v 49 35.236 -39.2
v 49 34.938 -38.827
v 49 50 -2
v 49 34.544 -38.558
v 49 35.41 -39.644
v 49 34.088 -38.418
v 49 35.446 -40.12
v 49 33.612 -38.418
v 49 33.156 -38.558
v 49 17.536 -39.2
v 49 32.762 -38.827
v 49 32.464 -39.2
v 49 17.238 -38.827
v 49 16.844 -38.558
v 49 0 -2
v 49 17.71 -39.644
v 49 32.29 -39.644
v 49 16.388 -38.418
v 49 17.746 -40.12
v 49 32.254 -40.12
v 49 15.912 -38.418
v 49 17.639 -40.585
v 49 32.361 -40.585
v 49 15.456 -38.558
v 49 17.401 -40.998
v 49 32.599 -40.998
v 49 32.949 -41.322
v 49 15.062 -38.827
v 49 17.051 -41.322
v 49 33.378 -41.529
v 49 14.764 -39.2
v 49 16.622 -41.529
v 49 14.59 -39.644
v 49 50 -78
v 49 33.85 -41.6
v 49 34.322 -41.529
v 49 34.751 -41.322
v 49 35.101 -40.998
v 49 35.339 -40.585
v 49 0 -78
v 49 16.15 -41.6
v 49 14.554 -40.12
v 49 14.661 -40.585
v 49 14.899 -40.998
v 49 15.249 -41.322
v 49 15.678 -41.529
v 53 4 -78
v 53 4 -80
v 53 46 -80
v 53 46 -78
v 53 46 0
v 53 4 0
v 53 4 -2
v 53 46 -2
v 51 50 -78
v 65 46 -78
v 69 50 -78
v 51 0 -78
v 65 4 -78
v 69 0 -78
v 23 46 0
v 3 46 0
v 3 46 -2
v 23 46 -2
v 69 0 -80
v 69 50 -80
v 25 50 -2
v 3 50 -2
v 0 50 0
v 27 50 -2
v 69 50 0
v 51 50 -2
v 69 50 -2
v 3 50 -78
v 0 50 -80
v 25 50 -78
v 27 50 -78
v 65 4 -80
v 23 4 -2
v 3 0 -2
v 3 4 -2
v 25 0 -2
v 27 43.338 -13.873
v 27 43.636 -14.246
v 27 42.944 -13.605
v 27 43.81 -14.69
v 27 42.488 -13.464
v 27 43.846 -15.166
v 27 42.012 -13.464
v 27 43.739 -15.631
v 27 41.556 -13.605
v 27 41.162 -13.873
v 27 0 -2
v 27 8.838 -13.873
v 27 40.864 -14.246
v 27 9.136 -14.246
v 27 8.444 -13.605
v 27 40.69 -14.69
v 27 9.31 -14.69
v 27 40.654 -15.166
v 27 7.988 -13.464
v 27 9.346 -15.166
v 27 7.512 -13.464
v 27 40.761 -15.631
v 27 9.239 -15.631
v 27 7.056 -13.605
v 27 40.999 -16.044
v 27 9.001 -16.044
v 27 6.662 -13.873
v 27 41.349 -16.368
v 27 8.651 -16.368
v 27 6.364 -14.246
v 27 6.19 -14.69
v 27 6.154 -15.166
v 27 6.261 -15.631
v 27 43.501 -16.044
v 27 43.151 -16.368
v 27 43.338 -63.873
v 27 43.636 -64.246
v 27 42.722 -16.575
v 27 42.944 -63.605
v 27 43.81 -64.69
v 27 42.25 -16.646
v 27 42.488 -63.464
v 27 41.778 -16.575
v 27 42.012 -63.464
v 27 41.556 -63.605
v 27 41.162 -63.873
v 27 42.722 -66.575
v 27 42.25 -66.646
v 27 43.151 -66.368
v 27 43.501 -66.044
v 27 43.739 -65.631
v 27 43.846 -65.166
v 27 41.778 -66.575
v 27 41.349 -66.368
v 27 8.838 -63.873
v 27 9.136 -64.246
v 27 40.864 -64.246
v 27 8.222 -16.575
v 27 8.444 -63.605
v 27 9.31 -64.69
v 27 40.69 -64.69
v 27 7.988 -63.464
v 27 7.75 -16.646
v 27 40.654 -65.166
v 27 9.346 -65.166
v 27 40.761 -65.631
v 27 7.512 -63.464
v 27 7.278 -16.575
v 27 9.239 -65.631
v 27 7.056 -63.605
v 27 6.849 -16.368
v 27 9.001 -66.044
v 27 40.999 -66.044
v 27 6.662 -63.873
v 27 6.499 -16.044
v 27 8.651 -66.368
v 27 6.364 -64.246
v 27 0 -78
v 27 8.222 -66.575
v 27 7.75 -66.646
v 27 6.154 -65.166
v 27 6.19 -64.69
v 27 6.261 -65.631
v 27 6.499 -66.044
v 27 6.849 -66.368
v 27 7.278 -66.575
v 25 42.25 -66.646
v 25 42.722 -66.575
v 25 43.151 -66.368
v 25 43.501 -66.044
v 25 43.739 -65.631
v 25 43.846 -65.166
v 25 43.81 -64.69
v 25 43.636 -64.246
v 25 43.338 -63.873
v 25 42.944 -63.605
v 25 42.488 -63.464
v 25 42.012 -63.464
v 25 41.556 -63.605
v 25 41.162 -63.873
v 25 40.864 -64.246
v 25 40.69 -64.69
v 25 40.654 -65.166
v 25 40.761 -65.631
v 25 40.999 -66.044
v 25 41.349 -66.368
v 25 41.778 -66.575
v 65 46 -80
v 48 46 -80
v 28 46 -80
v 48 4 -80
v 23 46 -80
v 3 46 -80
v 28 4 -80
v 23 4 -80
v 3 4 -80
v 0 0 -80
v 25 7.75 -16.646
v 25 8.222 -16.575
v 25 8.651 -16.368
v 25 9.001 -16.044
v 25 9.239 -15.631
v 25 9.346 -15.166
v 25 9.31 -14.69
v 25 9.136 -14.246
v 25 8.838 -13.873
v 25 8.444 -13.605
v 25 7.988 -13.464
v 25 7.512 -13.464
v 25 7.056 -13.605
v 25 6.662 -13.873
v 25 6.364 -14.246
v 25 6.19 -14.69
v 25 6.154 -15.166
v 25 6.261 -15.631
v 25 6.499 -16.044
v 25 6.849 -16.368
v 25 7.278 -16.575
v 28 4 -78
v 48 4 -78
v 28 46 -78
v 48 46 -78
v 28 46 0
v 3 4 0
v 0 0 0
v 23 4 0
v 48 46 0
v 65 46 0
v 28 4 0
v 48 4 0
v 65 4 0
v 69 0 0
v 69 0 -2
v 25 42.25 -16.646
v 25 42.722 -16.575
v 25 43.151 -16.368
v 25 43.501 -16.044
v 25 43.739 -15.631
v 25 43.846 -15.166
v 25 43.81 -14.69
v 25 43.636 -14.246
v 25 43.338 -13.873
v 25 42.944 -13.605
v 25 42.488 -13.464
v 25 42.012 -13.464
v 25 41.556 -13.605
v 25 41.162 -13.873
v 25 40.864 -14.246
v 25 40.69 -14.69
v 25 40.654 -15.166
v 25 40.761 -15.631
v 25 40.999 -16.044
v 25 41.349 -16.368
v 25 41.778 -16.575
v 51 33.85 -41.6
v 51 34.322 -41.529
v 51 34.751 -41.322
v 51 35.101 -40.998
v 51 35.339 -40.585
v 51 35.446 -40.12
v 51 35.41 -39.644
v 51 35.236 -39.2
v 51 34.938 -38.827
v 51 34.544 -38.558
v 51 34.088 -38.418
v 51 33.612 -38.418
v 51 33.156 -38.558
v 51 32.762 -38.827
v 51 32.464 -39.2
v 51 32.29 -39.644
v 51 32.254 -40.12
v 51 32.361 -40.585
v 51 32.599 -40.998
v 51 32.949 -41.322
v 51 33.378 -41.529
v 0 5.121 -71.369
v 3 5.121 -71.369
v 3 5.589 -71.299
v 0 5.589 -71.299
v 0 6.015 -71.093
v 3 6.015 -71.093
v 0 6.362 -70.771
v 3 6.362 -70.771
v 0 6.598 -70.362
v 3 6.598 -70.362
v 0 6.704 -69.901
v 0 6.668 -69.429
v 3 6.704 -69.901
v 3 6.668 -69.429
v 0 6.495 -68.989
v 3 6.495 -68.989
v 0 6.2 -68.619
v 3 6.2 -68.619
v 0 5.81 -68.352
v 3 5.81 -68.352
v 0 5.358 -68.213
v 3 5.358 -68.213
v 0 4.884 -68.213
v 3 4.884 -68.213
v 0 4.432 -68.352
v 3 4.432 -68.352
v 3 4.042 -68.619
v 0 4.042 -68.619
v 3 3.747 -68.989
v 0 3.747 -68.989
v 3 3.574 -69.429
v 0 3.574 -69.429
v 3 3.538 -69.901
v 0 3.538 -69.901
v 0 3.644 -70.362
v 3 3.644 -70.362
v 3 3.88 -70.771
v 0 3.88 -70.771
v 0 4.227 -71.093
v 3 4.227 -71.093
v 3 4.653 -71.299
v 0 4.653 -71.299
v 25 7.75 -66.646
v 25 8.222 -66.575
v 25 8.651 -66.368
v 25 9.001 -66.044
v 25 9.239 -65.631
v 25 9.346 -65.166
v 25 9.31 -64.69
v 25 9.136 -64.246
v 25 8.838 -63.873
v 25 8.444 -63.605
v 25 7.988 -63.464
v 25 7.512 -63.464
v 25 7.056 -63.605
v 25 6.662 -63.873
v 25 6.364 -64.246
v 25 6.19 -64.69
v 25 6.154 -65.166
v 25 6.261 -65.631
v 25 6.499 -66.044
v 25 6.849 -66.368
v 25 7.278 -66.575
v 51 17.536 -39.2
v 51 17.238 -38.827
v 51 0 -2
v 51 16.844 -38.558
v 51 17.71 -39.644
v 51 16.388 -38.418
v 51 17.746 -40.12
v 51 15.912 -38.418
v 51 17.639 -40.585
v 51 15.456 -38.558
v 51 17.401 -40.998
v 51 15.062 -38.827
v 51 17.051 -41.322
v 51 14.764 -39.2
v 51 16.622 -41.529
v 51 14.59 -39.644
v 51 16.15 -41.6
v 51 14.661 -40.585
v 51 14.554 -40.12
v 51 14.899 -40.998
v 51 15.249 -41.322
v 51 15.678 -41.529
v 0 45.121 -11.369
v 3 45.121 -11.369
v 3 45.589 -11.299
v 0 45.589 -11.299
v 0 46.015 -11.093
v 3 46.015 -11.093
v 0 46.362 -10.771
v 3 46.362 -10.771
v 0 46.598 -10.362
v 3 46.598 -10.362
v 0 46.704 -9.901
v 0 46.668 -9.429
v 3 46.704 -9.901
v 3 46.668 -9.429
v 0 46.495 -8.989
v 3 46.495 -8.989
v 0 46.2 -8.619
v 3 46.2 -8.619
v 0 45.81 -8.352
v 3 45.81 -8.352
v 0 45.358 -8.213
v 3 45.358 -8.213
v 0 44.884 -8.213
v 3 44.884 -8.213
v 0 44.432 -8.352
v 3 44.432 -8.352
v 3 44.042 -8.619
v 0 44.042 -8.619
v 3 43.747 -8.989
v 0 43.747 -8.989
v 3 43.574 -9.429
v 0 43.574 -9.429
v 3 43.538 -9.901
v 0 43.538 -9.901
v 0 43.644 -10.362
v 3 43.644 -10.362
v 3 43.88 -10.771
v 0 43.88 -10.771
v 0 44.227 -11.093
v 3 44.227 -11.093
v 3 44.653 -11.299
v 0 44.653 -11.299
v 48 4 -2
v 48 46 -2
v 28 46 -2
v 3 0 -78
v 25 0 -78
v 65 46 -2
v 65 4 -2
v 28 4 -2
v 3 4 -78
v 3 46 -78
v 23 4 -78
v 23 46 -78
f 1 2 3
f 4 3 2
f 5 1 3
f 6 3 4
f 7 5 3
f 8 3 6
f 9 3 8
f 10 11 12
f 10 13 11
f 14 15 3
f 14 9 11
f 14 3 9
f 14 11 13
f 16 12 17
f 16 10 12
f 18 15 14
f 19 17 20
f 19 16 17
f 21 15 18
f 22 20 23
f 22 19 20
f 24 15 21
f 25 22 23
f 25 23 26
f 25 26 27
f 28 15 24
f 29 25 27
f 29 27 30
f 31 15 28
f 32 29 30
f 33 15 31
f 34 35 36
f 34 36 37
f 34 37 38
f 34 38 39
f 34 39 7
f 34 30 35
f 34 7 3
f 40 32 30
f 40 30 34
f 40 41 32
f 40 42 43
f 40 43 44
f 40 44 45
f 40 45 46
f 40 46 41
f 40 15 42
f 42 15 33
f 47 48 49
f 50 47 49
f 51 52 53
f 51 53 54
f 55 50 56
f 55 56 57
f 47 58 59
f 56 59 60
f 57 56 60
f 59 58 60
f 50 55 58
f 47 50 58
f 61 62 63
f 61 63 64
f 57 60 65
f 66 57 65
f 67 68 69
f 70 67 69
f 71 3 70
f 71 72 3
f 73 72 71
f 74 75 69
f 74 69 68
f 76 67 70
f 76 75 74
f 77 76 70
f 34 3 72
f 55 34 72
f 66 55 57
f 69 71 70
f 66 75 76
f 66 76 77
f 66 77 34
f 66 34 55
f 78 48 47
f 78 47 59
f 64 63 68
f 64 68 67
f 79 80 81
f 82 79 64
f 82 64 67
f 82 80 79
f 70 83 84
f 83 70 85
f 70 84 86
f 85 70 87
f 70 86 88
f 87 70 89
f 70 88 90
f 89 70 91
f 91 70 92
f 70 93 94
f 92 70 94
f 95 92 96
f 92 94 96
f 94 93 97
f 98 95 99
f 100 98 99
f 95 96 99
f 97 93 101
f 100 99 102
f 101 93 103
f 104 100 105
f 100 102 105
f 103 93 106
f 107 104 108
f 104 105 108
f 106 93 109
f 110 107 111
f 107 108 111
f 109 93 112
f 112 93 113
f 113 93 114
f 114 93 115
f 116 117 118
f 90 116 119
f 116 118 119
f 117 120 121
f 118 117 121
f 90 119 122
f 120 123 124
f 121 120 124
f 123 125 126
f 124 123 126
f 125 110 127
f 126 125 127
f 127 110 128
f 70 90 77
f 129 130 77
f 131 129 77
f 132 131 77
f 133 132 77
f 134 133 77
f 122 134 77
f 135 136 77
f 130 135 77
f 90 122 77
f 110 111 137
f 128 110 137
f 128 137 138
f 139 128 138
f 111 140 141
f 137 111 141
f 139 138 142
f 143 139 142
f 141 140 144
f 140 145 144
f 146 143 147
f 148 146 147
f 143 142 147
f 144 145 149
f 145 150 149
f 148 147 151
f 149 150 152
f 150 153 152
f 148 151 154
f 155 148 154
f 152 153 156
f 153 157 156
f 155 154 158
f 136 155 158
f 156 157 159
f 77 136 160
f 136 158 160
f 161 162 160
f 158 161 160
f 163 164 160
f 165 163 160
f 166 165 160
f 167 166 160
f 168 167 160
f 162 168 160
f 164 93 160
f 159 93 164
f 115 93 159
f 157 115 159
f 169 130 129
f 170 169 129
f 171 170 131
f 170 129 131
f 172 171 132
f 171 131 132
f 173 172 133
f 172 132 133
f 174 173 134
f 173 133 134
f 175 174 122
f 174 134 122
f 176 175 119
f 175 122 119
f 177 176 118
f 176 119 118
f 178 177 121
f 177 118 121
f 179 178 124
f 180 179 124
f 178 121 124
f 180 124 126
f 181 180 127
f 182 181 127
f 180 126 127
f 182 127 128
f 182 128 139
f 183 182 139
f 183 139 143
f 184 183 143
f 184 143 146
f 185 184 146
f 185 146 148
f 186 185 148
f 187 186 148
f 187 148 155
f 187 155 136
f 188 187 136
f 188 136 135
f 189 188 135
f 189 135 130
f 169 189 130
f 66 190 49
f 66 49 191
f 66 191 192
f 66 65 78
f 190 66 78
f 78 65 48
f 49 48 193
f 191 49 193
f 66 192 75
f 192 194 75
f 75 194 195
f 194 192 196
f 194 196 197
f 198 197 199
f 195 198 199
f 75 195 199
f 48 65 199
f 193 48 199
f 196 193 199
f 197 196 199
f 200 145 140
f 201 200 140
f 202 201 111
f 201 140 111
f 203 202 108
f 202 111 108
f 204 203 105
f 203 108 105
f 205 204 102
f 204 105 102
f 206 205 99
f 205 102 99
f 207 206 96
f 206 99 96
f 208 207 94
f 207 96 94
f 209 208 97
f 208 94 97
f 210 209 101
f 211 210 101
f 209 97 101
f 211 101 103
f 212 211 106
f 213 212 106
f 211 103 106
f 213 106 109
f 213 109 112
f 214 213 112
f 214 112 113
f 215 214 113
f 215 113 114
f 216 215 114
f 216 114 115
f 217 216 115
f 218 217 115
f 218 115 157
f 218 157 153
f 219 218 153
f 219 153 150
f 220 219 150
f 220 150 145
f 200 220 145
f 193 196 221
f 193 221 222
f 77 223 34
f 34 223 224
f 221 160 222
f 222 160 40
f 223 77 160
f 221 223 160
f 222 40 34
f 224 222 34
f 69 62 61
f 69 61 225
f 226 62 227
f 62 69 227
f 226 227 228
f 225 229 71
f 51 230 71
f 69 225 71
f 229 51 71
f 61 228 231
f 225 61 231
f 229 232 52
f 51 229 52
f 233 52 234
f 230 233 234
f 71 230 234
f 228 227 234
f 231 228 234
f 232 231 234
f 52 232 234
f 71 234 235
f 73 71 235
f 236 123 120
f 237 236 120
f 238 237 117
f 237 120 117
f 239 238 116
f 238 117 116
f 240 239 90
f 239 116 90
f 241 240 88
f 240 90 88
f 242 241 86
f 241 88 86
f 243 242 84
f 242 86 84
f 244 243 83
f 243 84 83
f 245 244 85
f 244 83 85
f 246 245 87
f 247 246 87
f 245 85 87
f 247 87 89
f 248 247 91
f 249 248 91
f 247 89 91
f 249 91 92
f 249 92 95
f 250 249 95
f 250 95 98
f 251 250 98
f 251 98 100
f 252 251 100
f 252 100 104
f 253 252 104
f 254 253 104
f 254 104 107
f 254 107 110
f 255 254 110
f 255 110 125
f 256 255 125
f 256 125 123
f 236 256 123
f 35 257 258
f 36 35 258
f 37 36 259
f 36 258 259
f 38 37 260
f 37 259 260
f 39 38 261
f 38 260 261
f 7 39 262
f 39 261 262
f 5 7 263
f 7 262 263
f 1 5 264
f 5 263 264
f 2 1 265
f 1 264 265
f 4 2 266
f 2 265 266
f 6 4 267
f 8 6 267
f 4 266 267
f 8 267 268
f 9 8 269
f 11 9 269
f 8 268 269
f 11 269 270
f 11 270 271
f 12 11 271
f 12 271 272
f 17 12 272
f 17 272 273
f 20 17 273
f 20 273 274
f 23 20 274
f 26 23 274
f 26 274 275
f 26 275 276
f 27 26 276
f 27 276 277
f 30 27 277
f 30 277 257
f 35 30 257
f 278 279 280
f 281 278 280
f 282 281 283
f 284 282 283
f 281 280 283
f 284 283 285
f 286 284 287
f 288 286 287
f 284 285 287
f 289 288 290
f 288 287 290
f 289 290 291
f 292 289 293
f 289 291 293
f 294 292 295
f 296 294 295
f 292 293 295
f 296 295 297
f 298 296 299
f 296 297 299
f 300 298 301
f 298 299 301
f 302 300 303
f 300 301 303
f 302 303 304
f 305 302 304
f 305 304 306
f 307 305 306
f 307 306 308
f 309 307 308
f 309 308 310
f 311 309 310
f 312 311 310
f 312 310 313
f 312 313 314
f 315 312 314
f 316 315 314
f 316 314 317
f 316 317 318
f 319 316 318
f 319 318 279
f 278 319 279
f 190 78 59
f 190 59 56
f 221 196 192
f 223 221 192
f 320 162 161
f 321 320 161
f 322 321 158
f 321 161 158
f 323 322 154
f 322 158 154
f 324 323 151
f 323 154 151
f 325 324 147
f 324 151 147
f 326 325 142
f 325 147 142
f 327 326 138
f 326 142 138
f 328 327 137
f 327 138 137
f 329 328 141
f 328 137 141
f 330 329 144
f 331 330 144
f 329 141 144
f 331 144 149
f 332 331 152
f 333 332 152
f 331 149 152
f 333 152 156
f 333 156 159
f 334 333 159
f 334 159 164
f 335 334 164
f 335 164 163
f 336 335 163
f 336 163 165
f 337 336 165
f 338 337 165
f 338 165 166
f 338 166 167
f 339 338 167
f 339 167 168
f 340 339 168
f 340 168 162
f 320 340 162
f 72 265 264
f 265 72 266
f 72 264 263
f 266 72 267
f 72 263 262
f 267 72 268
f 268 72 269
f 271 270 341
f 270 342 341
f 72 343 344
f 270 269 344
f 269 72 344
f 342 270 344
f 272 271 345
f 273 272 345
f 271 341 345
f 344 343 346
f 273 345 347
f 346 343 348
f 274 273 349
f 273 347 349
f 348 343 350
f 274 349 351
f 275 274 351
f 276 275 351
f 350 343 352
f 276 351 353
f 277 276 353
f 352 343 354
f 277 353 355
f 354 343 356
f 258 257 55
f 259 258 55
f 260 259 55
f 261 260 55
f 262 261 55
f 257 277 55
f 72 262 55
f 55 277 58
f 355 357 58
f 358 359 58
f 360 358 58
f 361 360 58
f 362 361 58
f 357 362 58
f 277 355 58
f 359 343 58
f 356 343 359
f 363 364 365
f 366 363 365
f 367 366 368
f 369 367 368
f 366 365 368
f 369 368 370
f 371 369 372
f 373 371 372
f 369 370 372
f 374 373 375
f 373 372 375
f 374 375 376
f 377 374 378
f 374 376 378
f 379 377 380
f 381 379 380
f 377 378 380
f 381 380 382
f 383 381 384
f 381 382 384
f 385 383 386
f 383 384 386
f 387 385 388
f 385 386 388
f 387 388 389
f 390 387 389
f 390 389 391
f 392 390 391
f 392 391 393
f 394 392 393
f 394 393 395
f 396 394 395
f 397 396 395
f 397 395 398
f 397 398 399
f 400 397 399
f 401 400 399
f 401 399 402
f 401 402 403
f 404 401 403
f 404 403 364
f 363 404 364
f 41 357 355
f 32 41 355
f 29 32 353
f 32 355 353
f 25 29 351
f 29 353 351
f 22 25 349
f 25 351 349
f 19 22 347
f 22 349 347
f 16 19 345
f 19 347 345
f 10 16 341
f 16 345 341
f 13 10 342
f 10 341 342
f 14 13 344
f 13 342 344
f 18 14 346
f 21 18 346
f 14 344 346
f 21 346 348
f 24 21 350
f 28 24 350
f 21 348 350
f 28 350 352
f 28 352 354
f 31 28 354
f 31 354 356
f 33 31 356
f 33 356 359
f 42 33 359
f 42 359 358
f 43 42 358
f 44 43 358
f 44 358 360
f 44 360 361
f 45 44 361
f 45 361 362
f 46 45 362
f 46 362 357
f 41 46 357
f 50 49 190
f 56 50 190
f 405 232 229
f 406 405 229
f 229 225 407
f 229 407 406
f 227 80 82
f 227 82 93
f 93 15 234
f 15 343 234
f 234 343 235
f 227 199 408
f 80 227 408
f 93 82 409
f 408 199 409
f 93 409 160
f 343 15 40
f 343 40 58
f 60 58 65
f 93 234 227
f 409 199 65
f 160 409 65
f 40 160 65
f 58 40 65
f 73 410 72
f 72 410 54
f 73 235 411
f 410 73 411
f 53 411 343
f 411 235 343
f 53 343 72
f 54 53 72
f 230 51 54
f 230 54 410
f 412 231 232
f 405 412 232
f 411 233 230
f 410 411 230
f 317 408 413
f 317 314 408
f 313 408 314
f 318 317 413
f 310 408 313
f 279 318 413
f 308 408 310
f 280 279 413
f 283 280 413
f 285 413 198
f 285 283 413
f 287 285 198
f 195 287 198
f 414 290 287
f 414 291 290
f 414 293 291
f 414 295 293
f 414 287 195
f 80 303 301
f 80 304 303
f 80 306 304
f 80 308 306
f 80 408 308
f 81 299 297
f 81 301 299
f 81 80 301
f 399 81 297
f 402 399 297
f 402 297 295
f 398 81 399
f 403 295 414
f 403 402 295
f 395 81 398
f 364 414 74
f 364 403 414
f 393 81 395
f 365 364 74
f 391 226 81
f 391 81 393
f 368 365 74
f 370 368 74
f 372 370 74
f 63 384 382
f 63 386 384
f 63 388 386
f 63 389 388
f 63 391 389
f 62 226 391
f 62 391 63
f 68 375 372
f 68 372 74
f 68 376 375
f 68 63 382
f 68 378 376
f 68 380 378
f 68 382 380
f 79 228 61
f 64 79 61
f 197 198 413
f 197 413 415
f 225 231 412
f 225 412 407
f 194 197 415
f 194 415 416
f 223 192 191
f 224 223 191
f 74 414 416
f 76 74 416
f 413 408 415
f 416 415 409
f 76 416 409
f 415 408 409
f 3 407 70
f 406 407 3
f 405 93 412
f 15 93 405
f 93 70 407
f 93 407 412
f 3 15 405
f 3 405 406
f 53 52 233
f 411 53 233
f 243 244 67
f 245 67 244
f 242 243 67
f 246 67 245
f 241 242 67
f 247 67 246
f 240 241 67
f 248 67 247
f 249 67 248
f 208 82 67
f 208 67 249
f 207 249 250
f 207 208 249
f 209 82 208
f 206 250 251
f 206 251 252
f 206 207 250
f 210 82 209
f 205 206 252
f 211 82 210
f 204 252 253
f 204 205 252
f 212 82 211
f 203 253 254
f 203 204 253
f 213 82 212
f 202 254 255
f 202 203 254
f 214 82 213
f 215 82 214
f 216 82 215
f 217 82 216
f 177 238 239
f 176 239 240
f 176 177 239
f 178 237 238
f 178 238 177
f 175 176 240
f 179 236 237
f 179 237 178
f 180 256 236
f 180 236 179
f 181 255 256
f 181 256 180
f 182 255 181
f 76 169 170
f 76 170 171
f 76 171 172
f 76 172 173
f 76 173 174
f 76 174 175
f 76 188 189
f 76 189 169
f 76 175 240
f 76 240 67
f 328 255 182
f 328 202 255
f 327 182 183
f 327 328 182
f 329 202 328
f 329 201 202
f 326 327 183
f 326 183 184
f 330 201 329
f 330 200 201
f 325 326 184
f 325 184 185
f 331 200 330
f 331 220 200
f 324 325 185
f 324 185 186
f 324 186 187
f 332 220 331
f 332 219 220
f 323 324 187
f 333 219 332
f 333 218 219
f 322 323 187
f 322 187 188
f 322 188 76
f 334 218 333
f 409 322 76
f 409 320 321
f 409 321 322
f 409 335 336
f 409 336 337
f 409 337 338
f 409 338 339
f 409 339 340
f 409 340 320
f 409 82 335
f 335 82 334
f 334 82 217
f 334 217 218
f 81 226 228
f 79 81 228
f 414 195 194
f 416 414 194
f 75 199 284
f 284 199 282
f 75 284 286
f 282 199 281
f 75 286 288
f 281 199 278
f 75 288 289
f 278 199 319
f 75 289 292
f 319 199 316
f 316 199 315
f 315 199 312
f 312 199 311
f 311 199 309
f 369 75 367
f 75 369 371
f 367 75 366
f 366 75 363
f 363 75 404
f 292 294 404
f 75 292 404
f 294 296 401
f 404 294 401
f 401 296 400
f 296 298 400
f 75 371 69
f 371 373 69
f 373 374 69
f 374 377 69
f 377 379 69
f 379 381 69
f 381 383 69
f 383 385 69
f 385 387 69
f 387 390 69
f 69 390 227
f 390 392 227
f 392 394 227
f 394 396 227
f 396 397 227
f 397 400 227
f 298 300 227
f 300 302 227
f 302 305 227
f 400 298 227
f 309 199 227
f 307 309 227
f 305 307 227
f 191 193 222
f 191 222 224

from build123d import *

# Parameters (mm, degrees)
SKETCH_1_W          = 22
SKETCH_1_H          = 76
EXTRUDE_1_DEPTH     = 50
SKETCH_5_W          = 20
SKETCH_5_H          = 42
SKETCH_5_W_2        = 12
CUT_EXTRUDE_1_DEPTH = 10
SKETCH_2_R          = 1.6
CUT_EXTRUDE_2_DEPTH = 10
SKETCH_3_R          = 1.6
CUT_EXTRUDE_3_DEPTH = 10
SKETCH_4_R          = 1.587
CUT_EXTRUDE_4_DEPTH = 10


with BuildPart() as part:
    # 草图1 → 凸台-拉伸1 (new body)
    with BuildSketch(Plane(origin=(0, 0, 0), x_dir=(1, 0, 0), z_dir=(0, 1, 0))):
        Polygon((0, 0), (69, 0), (69, 2), (51, 2), (51, 78), (69, 78), (69, 80), (0, 80), align=None)
        with Locations((14, 40)):
            Rectangle(SKETCH_1_W, SKETCH_1_H, mode=Mode.SUBTRACT)
        with Locations((38, 40)):
            Rectangle(SKETCH_1_W, SKETCH_1_H, mode=Mode.SUBTRACT)
    extrude(amount=EXTRUDE_1_DEPTH)

    # 草图5 → 切除-拉伸1 (cut)
    with BuildSketch(Plane.XY):
        with Locations((13, 25)):
            Rectangle(SKETCH_5_W, SKETCH_5_H)
        with Locations((38, 25)):
            Rectangle(SKETCH_5_W, SKETCH_5_H)
        with Locations((59, 25)):
            Rectangle(SKETCH_5_W_2, SKETCH_5_H)
    cut_extrude_1 = extrude(amount=-CUT_EXTRUDE_1_DEPTH, mode=Mode.SUBTRACT)

    # 镜向1: 切除-拉伸1 across plane
    add(cut_extrude_1.mirror(Plane.XY.offset(-40)), mode=Mode.SUBTRACT)

    # 草图2 → 切除-拉伸2 (cut)
    with BuildSketch(Plane(origin=(51, 0, 0), x_dir=(0, 0, -1), z_dir=(1, 0, 0))):
        with Locations((40, 33.85)):
            Circle(SKETCH_2_R)
        with Locations((40, 16.15)):
            Circle(SKETCH_2_R)
    extrude(amount=-CUT_EXTRUDE_2_DEPTH, mode=Mode.SUBTRACT)

    # 草图3 → 切除-拉伸3 (cut)
    with BuildSketch(Plane(origin=(27, 0, 0), x_dir=(0, 0, -1), z_dir=(1, 0, 0))):
        with Locations((15.046260159, 7.75)):
            Circle(SKETCH_3_R)
        with Locations((65.046260159, 7.75)):
            Circle(SKETCH_3_R)
        with Locations((15.046260159, 42.25)):
            Circle(SKETCH_3_R)
        with Locations((65.046260159, 42.25)):
            Circle(SKETCH_3_R)
    extrude(amount=-CUT_EXTRUDE_3_DEPTH, mode=Mode.SUBTRACT)

    # 草图4 → 切除-拉伸4 (cut)
    with BuildSketch(Plane(origin=(3, 0, 0), x_dir=(0, 0, -1), z_dir=(1, 0, 0))):
        with Locations((69.78201983, 5.121000004)):
            Circle(SKETCH_4_R)
        with Locations((9.78201983, 45.121000004)):
            Circle(SKETCH_4_R)
    extrude(amount=-CUT_EXTRUDE_4_DEPTH, mode=Mode.SUBTRACT)


solid = part.part
